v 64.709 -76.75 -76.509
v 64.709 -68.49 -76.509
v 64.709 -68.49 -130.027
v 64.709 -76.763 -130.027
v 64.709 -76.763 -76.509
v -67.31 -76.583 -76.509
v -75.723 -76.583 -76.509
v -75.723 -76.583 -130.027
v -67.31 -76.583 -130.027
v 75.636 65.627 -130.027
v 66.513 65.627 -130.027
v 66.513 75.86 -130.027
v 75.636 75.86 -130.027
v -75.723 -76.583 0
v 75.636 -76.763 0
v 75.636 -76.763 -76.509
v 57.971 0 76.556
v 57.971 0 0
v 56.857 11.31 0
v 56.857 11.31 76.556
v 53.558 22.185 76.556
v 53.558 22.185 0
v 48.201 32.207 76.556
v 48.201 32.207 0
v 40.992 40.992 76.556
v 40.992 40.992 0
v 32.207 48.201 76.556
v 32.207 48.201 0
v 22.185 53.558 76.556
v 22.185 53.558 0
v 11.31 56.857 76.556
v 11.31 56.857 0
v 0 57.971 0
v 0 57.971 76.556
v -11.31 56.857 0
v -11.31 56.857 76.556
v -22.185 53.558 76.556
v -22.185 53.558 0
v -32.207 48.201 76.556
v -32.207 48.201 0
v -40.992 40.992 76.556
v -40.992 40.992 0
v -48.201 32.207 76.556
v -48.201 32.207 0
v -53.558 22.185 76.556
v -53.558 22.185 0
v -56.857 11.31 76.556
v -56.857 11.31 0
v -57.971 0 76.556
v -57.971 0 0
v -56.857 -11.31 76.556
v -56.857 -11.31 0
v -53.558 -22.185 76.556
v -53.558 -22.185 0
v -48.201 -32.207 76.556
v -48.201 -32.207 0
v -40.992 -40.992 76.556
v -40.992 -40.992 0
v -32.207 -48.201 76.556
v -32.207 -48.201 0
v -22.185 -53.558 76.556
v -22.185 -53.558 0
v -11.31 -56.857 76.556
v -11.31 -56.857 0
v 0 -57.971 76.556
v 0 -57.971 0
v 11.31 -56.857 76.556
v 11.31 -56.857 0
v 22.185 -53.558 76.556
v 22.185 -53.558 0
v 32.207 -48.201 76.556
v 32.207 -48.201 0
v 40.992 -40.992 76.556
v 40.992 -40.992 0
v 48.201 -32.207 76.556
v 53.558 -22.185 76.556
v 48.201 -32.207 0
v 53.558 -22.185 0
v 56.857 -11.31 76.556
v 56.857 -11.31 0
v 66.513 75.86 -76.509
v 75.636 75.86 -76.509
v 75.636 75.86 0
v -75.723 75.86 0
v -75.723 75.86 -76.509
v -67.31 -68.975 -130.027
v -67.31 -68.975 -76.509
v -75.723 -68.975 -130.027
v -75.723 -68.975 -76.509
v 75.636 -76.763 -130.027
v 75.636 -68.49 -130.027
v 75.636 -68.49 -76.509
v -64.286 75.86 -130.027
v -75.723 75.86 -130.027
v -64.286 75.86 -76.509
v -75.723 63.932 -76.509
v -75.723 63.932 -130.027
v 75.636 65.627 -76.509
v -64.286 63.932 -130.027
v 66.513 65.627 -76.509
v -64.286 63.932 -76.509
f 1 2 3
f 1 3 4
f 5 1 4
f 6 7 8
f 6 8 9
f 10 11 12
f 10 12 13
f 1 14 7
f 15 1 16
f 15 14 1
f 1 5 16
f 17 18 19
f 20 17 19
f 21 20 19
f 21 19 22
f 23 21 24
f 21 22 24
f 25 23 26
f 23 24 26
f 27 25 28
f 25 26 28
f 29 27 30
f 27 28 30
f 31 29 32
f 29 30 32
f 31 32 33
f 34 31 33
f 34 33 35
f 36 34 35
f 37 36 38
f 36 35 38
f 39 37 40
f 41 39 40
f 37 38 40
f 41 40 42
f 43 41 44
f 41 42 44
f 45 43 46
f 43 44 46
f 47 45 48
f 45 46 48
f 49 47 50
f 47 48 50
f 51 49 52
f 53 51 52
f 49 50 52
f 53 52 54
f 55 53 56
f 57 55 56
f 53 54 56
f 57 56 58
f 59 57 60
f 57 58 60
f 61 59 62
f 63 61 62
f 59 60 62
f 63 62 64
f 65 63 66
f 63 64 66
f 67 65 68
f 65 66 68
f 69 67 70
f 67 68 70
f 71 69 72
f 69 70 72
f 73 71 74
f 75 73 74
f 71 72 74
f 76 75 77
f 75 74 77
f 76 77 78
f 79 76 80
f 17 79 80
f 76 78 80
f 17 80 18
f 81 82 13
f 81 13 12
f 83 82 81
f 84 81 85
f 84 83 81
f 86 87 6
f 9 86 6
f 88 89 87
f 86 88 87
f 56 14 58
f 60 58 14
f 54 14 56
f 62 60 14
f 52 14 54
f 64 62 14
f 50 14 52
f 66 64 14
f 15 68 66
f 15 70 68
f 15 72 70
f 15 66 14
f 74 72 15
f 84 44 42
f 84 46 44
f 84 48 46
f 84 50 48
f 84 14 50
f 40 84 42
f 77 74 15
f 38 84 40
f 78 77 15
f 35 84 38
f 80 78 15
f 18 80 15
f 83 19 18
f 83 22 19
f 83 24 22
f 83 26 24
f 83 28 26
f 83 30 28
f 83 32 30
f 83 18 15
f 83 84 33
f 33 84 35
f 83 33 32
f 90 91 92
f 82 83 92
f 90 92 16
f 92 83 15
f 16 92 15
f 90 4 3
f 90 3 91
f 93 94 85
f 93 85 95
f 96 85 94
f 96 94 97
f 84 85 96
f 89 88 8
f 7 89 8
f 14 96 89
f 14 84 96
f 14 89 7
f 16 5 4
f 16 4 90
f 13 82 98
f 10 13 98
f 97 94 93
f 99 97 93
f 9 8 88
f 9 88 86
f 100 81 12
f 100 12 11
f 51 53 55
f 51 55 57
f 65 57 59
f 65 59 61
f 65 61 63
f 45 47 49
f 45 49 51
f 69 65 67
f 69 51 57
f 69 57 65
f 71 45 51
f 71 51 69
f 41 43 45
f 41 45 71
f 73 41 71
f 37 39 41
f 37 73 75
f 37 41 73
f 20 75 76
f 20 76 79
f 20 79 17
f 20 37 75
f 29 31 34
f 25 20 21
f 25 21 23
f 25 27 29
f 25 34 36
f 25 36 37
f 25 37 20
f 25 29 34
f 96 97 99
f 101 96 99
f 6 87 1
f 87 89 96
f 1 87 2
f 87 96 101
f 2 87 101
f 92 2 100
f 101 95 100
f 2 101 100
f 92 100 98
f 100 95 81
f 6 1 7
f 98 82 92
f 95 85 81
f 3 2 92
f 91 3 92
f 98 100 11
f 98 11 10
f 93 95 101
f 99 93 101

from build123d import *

# Parameters (mm, degrees)
F0_R     = 57.97101
F1_DEPTH = 76.556459
F3_DEPTH = 76.509021
F4_W     = 11.437774
F4_H     = 11.928283
F4_W_2   = 9.122617
F4_H_2   = 10.233626
F4_W_3   = 10.927506
F4_H_3   = 8.273392
F4_W_4   = 8.41286
F4_H_4   = 7.608004
F5_DEPTH = 53.518422


with BuildPart() as f1:
    # F0 (on Top) → F1 (new body)
    with BuildSketch(Plane.XY):
        Circle(F0_R)
    extrude(amount=F1_DEPTH)

    # F2 (on Top) → F3 (join)
    with BuildSketch(Plane.XY):
        Polygon((-75.723298, -76.582767), (75.636029, -76.763391), (75.636029, 75.860277), (-75.723298, 75.860277), align=None)
    extrude(amount=-F3_DEPTH)

    # F4 (on face) → F5 (join)
    with BuildSketch(Plane(origin=(0, 0, -76.509021), x_dir=(1, 0, 0), z_dir=(0, 0, -1))):
        with Locations((-70.004411, -69.896135)):
            Rectangle(F4_W, F4_H)
        with Locations((71.07472, -70.743464)):
            Rectangle(F4_W_2, F4_H_2)
        with Locations((70.172276, 72.626695)):
            Rectangle(F4_W_3, F4_H_3)
        with Locations((-71.516868, 72.778765)):
            Rectangle(F4_W_4, F4_H_4)
    extrude(amount=F5_DEPTH)


solid = f1.part
